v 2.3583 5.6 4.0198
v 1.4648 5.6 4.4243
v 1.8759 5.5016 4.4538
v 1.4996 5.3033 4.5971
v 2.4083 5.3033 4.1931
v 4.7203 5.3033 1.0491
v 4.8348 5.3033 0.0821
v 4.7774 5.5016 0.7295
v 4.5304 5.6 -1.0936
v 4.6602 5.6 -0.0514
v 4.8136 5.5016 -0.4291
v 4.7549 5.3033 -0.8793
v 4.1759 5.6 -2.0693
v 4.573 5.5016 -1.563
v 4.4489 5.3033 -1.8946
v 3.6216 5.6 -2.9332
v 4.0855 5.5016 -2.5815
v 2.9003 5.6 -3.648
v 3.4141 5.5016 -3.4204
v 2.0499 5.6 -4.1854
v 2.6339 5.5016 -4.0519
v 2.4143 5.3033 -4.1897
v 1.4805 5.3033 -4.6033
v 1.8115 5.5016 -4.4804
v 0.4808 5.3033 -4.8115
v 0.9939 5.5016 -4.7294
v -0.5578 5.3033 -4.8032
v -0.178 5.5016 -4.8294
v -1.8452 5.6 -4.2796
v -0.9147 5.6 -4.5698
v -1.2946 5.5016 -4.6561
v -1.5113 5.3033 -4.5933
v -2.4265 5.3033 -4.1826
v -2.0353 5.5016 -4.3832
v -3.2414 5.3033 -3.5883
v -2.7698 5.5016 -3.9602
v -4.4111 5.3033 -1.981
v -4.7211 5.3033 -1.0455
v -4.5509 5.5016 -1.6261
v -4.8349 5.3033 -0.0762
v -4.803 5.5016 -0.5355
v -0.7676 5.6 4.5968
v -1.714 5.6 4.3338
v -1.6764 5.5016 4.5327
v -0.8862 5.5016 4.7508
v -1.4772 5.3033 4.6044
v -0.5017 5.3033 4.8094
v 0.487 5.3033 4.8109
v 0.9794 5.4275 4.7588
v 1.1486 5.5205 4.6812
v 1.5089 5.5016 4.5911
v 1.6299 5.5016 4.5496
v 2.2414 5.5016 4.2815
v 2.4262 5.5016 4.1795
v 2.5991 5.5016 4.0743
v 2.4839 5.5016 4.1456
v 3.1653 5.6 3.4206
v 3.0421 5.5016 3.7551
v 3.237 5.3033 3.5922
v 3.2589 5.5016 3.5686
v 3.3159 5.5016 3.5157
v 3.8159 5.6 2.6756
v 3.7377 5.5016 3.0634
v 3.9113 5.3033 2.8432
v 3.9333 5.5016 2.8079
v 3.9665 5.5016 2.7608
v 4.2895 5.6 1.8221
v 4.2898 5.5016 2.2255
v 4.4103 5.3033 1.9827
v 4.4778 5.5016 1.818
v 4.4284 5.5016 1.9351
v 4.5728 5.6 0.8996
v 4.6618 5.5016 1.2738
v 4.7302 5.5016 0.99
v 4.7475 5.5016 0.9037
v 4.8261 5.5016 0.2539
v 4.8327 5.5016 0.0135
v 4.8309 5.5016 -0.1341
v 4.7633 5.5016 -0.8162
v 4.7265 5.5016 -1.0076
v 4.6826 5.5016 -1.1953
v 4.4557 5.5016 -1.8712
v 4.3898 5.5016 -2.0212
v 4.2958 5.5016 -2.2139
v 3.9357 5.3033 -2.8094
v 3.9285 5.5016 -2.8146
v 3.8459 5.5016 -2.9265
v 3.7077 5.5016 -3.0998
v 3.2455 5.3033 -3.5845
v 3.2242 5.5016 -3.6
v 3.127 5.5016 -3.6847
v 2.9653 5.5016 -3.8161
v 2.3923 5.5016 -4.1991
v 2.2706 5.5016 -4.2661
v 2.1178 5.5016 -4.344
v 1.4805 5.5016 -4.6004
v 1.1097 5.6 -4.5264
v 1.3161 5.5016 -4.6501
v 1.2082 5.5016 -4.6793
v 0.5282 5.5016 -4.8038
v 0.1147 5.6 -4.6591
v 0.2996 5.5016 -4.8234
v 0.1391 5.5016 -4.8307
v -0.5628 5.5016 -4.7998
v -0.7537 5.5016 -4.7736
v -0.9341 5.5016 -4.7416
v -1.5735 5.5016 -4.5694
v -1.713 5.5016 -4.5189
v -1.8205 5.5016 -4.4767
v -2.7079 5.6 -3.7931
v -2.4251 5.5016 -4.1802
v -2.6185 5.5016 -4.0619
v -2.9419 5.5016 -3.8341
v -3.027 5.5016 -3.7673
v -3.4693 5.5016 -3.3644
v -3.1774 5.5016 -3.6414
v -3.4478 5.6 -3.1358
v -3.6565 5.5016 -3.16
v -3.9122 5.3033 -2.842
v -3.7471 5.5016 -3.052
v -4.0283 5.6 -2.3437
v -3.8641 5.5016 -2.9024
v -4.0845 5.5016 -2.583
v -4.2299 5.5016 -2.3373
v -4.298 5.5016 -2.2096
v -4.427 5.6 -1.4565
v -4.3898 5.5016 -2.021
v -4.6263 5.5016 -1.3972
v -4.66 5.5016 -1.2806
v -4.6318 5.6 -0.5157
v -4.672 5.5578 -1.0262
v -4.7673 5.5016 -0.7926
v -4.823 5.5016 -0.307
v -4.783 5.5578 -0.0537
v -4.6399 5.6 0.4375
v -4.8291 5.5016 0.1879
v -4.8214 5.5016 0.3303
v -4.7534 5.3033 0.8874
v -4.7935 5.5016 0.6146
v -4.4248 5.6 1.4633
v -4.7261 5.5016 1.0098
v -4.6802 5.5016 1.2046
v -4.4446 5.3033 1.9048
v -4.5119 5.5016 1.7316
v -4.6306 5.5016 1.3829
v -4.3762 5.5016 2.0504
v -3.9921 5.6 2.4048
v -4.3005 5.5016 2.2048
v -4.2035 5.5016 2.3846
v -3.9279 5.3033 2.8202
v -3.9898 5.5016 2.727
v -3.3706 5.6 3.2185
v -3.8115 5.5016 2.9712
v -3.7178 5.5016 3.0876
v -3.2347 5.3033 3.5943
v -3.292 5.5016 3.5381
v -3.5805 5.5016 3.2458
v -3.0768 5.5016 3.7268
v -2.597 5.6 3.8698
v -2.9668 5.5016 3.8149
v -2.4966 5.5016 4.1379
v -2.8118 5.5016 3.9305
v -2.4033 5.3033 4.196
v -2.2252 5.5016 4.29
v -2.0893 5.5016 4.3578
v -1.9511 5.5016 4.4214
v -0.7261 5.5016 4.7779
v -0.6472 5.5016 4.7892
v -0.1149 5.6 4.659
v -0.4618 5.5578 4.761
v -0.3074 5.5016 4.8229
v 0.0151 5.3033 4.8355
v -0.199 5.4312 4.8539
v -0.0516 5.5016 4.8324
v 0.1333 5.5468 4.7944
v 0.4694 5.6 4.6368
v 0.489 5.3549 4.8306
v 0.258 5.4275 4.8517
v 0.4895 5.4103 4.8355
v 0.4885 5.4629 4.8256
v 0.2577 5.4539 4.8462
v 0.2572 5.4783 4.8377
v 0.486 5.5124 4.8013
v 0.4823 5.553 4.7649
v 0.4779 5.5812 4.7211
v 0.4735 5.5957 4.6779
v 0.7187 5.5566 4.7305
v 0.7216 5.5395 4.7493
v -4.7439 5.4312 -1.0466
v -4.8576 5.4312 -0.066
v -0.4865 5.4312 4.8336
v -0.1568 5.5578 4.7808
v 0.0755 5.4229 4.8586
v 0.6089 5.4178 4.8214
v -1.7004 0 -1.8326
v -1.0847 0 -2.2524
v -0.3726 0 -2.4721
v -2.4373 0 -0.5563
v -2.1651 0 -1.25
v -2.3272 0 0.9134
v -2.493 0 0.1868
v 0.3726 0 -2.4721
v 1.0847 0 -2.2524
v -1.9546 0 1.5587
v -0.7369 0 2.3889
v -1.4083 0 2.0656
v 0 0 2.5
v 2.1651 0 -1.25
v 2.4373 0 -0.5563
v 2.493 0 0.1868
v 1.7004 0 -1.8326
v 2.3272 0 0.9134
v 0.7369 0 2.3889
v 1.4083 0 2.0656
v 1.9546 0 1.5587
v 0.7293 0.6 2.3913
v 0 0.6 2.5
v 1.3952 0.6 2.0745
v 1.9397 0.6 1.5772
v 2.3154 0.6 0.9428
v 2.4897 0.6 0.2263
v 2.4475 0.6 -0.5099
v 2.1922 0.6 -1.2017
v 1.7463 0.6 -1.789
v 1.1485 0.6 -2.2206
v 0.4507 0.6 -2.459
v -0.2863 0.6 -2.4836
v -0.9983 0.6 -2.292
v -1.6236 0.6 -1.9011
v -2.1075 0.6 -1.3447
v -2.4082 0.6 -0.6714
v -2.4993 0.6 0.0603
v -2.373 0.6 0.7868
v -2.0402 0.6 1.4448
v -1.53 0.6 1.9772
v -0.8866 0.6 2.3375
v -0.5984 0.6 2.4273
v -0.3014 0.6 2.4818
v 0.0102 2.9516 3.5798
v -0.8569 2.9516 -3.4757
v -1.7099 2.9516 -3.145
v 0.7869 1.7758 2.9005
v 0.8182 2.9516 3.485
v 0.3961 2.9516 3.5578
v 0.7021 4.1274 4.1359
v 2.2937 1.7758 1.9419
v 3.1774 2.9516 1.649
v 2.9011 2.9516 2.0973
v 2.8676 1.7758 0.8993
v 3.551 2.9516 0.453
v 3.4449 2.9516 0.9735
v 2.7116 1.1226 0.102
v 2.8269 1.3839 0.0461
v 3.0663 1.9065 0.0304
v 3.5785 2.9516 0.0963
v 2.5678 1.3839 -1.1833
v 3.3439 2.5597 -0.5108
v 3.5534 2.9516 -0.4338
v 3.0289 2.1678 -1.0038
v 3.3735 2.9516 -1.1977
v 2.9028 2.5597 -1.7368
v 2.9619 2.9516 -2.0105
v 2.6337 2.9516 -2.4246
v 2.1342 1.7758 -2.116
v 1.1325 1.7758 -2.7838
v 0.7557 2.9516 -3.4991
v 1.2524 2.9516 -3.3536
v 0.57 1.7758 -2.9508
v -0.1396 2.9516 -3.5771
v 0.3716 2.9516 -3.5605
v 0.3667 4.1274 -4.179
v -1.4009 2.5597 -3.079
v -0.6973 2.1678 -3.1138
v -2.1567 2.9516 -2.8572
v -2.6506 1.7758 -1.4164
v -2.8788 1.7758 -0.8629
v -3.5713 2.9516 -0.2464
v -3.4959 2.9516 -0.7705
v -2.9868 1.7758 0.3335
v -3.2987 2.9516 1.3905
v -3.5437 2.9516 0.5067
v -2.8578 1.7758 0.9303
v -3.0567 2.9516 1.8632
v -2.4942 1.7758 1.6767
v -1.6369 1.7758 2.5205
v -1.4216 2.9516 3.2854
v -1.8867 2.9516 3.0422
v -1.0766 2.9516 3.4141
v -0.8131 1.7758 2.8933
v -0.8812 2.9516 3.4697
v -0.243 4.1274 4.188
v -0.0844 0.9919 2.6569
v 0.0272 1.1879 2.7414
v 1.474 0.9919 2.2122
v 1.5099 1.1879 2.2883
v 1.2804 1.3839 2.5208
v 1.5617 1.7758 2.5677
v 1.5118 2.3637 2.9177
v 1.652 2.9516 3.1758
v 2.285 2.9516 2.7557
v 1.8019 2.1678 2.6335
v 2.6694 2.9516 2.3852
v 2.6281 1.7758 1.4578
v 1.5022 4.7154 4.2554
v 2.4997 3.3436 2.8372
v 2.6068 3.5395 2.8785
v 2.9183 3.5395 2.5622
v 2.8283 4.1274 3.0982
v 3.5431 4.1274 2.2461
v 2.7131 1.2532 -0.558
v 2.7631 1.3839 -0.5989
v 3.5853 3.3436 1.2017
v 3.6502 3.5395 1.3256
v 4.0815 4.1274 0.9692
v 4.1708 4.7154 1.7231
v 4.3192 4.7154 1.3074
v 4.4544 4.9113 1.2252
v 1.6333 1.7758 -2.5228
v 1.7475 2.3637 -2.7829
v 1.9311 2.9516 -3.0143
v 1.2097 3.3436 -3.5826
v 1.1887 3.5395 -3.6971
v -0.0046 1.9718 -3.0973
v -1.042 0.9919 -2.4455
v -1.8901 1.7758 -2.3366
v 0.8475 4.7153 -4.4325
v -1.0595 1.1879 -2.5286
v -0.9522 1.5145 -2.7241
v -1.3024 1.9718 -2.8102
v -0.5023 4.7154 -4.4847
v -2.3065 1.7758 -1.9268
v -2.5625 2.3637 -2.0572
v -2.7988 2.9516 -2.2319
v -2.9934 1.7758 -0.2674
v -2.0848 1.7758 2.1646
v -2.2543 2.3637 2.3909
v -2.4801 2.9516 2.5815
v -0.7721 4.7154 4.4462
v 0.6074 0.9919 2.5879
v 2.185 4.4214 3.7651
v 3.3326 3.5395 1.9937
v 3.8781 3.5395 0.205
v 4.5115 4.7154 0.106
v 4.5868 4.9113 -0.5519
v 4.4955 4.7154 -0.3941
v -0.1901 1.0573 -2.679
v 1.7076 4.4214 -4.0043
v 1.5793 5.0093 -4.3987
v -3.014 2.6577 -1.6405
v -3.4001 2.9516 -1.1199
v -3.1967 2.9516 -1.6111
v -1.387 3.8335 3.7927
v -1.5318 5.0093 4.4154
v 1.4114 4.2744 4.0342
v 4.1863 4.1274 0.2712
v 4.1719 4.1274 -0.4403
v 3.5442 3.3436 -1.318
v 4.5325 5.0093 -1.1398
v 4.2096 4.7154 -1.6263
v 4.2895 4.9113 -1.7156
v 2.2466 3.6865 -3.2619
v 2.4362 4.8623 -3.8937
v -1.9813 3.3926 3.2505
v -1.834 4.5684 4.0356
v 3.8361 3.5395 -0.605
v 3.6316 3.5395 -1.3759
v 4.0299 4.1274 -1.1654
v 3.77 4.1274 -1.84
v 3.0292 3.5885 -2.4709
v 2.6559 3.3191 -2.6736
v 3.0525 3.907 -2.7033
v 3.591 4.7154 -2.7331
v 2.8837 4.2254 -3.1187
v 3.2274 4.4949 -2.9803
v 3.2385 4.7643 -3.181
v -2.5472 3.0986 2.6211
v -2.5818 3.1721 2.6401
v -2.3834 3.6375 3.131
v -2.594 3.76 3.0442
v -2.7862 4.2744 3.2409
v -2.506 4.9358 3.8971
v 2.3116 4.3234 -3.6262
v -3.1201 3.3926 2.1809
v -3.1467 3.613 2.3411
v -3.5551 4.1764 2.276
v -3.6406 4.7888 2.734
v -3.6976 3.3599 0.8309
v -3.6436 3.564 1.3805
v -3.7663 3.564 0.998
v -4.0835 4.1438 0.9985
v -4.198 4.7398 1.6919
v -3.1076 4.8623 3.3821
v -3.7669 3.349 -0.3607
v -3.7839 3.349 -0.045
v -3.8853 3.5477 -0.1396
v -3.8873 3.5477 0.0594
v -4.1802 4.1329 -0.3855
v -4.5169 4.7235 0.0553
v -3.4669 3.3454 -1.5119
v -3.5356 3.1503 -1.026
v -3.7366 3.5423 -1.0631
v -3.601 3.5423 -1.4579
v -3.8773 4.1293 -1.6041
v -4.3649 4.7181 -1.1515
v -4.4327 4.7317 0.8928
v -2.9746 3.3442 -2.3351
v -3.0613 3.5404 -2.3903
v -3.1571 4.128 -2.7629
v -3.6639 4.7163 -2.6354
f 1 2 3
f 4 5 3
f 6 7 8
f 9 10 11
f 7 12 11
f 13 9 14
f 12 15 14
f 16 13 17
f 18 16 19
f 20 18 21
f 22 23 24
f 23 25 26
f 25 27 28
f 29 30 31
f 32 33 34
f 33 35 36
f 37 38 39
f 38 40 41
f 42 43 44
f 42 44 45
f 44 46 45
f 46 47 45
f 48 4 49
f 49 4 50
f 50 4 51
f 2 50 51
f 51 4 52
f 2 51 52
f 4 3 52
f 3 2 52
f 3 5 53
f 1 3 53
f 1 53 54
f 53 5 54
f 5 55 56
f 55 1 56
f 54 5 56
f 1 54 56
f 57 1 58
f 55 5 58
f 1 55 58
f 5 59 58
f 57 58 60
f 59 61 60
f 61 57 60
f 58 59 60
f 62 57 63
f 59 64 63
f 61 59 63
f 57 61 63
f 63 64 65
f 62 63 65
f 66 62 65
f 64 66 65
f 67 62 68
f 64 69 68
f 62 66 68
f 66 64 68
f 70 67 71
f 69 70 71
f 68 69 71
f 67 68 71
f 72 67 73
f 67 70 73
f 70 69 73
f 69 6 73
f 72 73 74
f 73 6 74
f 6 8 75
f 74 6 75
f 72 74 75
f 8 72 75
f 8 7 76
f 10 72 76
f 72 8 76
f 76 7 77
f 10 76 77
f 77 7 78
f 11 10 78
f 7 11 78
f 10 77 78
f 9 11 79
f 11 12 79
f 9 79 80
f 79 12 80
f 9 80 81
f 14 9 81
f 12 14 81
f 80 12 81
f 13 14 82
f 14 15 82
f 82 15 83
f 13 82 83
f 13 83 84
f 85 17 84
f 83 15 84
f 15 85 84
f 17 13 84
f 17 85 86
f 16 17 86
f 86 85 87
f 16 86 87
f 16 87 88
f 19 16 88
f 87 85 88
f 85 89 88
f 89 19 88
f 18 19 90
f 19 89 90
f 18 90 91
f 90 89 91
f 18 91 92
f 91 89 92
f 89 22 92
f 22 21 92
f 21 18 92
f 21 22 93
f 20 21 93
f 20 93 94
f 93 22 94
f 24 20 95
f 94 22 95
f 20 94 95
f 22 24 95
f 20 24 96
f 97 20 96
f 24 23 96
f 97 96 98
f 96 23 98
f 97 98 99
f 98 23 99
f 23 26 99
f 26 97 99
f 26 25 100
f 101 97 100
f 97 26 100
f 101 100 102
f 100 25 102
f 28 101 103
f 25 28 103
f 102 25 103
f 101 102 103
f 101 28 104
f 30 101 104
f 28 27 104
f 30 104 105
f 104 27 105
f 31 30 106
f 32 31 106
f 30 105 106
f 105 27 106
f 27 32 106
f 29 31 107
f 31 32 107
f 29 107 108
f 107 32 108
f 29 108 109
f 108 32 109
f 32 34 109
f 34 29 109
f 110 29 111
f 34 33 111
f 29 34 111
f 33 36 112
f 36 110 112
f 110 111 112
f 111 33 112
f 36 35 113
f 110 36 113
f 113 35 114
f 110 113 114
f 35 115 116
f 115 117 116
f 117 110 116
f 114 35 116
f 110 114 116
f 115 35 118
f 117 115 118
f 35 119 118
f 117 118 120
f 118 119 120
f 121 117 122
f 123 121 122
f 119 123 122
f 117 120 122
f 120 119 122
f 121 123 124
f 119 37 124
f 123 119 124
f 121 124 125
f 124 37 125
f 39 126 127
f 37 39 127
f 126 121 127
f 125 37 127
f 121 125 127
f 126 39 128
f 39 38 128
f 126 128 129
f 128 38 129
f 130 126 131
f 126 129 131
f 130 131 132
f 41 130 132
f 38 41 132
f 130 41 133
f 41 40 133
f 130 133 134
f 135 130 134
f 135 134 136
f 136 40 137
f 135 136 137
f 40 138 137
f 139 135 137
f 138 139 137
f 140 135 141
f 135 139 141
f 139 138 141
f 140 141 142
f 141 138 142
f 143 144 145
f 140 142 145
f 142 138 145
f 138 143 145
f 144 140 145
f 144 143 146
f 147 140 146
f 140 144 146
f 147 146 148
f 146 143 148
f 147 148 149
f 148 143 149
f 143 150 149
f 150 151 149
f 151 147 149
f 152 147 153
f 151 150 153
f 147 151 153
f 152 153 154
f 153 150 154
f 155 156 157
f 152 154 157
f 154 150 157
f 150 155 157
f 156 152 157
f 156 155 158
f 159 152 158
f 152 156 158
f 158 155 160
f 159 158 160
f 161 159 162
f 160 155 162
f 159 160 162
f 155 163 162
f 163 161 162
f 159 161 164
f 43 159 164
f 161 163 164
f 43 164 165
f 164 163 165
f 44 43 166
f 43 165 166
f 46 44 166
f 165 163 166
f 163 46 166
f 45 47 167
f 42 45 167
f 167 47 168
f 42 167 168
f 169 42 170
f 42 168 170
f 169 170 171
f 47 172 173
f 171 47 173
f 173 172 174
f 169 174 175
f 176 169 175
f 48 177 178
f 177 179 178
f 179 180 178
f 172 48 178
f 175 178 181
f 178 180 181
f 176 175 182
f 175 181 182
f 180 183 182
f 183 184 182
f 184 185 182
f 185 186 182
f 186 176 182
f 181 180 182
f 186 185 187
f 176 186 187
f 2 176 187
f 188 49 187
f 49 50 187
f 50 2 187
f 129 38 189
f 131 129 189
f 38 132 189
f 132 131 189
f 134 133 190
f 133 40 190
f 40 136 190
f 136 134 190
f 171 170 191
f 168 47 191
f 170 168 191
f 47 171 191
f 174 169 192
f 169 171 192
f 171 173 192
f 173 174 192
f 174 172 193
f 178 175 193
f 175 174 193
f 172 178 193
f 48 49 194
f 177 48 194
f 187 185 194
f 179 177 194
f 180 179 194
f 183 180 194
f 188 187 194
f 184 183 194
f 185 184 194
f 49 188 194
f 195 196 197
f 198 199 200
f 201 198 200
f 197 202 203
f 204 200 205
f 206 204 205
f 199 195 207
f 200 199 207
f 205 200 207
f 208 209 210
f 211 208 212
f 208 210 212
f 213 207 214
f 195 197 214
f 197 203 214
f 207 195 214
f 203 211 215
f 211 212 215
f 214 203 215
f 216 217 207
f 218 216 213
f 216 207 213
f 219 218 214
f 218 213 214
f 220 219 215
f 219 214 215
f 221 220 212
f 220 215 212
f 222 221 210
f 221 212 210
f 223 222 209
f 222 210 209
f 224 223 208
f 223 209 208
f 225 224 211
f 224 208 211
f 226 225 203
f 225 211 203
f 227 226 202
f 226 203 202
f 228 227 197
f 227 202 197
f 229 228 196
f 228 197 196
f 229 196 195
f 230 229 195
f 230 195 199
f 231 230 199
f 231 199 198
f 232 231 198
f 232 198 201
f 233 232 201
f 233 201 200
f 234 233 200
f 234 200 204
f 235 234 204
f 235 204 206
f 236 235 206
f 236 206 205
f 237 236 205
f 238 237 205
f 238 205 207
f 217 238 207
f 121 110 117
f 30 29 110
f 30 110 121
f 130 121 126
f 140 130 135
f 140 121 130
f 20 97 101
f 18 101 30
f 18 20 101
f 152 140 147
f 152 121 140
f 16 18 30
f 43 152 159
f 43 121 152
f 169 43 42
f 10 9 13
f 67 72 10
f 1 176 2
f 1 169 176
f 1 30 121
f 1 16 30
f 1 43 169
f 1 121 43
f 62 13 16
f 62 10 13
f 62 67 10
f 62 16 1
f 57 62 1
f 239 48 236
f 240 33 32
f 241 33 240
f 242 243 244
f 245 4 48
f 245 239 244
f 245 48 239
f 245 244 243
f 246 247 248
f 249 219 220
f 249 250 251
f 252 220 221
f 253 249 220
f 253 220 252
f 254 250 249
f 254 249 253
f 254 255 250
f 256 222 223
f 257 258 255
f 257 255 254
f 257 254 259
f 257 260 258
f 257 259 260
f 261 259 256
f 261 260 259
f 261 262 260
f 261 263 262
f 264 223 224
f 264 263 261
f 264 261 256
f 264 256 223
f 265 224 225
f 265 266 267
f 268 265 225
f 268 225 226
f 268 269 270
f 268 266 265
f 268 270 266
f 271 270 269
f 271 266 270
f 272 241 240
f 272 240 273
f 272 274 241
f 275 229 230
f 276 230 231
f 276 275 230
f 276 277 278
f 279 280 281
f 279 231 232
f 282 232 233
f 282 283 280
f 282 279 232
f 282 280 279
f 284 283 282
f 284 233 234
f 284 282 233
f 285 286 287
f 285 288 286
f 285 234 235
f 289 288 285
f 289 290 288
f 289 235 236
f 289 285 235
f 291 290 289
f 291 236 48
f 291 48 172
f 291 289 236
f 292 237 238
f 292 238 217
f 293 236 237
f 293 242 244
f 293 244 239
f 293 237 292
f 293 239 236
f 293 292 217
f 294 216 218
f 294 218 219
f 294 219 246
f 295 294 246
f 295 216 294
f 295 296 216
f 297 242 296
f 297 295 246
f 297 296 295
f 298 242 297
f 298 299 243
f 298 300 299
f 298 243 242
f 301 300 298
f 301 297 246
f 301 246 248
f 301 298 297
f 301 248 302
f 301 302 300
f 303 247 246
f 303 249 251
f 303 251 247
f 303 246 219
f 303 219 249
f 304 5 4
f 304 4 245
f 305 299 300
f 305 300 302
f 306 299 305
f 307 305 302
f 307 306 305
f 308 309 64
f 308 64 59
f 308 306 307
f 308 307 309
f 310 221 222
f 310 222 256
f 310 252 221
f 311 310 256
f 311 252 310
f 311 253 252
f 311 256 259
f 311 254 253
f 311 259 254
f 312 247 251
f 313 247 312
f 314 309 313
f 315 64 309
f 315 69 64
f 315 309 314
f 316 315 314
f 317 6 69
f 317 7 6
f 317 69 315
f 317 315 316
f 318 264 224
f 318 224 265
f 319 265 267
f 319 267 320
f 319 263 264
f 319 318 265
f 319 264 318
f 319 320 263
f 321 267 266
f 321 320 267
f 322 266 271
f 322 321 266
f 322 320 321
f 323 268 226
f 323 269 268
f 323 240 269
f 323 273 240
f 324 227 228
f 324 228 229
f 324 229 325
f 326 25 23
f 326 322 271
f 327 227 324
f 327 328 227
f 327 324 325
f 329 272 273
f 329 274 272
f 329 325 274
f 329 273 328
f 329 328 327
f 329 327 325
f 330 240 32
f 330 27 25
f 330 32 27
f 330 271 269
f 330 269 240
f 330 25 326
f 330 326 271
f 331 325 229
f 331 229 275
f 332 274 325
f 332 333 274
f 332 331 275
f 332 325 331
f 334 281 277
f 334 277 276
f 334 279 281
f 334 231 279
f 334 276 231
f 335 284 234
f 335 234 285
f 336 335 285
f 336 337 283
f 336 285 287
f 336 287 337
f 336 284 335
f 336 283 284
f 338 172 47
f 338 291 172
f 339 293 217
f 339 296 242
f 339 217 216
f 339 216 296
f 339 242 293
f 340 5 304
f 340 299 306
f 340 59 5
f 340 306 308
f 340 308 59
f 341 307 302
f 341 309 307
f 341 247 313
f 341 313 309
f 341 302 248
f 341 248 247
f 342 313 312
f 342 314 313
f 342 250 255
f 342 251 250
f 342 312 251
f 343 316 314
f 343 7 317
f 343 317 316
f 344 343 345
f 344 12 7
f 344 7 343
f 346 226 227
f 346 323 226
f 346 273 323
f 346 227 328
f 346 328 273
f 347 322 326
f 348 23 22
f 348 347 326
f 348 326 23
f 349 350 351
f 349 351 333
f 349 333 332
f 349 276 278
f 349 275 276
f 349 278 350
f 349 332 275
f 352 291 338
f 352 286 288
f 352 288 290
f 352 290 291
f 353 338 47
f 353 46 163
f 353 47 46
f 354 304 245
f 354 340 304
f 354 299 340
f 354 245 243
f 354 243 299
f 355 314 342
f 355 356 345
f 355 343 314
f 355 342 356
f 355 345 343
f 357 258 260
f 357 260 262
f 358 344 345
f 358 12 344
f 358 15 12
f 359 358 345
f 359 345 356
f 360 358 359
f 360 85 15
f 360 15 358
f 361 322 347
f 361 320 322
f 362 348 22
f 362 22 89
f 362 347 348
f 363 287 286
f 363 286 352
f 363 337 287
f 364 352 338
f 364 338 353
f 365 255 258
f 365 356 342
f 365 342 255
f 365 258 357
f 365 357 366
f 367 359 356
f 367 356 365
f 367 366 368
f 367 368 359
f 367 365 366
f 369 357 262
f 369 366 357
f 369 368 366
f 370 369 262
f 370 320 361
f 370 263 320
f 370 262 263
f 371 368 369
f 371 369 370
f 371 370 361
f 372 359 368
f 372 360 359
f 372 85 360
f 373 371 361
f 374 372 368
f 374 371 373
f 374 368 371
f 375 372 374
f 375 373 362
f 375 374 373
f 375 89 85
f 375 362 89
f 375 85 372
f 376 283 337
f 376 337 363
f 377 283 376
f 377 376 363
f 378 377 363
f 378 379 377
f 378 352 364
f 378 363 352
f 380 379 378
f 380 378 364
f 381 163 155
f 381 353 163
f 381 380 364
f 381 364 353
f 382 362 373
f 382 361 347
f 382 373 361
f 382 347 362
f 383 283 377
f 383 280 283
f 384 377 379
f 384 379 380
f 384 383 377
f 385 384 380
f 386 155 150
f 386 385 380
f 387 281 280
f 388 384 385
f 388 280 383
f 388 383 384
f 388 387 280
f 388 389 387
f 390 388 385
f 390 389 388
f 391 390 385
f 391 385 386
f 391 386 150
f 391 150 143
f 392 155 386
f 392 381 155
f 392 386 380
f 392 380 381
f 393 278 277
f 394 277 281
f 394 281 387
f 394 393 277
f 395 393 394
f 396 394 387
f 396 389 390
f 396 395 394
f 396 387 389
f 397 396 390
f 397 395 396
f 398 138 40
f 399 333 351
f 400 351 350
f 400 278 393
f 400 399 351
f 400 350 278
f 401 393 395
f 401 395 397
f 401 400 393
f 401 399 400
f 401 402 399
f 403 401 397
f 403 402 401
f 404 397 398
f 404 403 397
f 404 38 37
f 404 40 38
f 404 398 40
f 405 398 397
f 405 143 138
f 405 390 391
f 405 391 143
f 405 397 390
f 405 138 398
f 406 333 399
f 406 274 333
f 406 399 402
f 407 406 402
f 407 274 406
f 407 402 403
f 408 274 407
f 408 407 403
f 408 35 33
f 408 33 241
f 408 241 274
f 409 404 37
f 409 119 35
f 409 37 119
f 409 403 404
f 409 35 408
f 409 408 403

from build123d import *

# Parameters (mm, degrees)
SKETCH1_R           = 2.5
BOSS_EXTRUDE1_DEPTH = 0.6
FILLET1_R           = 0.2


with BuildPart() as part:
    # Sketch1 → Boss-Extrude1 (new body)
    with BuildSketch(Plane(origin=(0, 0, 0), x_dir=(1, 0, 0), z_dir=(0, 1, 0))):
        with Locations(Location((0, 0, 0), (0, 0, 270))):
            Circle(SKETCH1_R)
    extrude(amount=BOSS_EXTRUDE1_DEPTH)

    # Loft1: read off the stored shape, not the designer's step
    # Loft1: loft between two sections, ruled curve by curve
    loft1_from = [
        Edge.make_bspline([(-0.886625195, 0.6, 2.337497757), (3.788370319, 0.6, 4.110748147), (5.561620709, 0.6, -0.564247367), (0.886625195, 0.6, -2.337497757), (-3.788370319, 0.6, -4.110748147), (-5.561620709, 0.6, 0.564247367), (-0.886625195, 0.6, 2.337497757)], [0, 0, 0, 0, 0.5, 0.5, 0.5, 1, 1, 1, 1], 3, [1, 0.333333333, 0.333333333, 1, 0.333333333, 0.333333333, 1]),
    ]
    loft1_to = [
        Edge.make_bspline([(0.573645482, 5.6, 4.966984081), (10.507613644, 5.6, 3.819693116), (9.36032268, 5.6, -6.114275046), (-0.573645482, 5.6, -4.966984081), (-10.507613644, 5.6, -3.819693116), (-9.36032268, 5.6, 6.114275046), (0.573645482, 5.6, 4.966984081)], [0, 0, 0, 0, 0.5, 0.5, 0.5, 1, 1, 1, 1], 3, [1, 0.333333333, 0.333333333, 1, 0.333333333, 0.333333333, 1]),
    ]
    loft1 = Solid(Shell([*[Face.make_surface_from_curves(loft1_from[k], loft1_to[k]) for k in range(1)], Face(Wire(loft1_from)), Face(Wire(loft1_to))]))
    add(loft1)

    # Fillet1
    fillet1_edges = [part.edges().sort_by_distance(p)[0] for p in [
        (-0.573645482, 5.6, -4.966984081),
    ]]
    fillet(fillet1_edges, radius=FILLET1_R)


solid = part.part
